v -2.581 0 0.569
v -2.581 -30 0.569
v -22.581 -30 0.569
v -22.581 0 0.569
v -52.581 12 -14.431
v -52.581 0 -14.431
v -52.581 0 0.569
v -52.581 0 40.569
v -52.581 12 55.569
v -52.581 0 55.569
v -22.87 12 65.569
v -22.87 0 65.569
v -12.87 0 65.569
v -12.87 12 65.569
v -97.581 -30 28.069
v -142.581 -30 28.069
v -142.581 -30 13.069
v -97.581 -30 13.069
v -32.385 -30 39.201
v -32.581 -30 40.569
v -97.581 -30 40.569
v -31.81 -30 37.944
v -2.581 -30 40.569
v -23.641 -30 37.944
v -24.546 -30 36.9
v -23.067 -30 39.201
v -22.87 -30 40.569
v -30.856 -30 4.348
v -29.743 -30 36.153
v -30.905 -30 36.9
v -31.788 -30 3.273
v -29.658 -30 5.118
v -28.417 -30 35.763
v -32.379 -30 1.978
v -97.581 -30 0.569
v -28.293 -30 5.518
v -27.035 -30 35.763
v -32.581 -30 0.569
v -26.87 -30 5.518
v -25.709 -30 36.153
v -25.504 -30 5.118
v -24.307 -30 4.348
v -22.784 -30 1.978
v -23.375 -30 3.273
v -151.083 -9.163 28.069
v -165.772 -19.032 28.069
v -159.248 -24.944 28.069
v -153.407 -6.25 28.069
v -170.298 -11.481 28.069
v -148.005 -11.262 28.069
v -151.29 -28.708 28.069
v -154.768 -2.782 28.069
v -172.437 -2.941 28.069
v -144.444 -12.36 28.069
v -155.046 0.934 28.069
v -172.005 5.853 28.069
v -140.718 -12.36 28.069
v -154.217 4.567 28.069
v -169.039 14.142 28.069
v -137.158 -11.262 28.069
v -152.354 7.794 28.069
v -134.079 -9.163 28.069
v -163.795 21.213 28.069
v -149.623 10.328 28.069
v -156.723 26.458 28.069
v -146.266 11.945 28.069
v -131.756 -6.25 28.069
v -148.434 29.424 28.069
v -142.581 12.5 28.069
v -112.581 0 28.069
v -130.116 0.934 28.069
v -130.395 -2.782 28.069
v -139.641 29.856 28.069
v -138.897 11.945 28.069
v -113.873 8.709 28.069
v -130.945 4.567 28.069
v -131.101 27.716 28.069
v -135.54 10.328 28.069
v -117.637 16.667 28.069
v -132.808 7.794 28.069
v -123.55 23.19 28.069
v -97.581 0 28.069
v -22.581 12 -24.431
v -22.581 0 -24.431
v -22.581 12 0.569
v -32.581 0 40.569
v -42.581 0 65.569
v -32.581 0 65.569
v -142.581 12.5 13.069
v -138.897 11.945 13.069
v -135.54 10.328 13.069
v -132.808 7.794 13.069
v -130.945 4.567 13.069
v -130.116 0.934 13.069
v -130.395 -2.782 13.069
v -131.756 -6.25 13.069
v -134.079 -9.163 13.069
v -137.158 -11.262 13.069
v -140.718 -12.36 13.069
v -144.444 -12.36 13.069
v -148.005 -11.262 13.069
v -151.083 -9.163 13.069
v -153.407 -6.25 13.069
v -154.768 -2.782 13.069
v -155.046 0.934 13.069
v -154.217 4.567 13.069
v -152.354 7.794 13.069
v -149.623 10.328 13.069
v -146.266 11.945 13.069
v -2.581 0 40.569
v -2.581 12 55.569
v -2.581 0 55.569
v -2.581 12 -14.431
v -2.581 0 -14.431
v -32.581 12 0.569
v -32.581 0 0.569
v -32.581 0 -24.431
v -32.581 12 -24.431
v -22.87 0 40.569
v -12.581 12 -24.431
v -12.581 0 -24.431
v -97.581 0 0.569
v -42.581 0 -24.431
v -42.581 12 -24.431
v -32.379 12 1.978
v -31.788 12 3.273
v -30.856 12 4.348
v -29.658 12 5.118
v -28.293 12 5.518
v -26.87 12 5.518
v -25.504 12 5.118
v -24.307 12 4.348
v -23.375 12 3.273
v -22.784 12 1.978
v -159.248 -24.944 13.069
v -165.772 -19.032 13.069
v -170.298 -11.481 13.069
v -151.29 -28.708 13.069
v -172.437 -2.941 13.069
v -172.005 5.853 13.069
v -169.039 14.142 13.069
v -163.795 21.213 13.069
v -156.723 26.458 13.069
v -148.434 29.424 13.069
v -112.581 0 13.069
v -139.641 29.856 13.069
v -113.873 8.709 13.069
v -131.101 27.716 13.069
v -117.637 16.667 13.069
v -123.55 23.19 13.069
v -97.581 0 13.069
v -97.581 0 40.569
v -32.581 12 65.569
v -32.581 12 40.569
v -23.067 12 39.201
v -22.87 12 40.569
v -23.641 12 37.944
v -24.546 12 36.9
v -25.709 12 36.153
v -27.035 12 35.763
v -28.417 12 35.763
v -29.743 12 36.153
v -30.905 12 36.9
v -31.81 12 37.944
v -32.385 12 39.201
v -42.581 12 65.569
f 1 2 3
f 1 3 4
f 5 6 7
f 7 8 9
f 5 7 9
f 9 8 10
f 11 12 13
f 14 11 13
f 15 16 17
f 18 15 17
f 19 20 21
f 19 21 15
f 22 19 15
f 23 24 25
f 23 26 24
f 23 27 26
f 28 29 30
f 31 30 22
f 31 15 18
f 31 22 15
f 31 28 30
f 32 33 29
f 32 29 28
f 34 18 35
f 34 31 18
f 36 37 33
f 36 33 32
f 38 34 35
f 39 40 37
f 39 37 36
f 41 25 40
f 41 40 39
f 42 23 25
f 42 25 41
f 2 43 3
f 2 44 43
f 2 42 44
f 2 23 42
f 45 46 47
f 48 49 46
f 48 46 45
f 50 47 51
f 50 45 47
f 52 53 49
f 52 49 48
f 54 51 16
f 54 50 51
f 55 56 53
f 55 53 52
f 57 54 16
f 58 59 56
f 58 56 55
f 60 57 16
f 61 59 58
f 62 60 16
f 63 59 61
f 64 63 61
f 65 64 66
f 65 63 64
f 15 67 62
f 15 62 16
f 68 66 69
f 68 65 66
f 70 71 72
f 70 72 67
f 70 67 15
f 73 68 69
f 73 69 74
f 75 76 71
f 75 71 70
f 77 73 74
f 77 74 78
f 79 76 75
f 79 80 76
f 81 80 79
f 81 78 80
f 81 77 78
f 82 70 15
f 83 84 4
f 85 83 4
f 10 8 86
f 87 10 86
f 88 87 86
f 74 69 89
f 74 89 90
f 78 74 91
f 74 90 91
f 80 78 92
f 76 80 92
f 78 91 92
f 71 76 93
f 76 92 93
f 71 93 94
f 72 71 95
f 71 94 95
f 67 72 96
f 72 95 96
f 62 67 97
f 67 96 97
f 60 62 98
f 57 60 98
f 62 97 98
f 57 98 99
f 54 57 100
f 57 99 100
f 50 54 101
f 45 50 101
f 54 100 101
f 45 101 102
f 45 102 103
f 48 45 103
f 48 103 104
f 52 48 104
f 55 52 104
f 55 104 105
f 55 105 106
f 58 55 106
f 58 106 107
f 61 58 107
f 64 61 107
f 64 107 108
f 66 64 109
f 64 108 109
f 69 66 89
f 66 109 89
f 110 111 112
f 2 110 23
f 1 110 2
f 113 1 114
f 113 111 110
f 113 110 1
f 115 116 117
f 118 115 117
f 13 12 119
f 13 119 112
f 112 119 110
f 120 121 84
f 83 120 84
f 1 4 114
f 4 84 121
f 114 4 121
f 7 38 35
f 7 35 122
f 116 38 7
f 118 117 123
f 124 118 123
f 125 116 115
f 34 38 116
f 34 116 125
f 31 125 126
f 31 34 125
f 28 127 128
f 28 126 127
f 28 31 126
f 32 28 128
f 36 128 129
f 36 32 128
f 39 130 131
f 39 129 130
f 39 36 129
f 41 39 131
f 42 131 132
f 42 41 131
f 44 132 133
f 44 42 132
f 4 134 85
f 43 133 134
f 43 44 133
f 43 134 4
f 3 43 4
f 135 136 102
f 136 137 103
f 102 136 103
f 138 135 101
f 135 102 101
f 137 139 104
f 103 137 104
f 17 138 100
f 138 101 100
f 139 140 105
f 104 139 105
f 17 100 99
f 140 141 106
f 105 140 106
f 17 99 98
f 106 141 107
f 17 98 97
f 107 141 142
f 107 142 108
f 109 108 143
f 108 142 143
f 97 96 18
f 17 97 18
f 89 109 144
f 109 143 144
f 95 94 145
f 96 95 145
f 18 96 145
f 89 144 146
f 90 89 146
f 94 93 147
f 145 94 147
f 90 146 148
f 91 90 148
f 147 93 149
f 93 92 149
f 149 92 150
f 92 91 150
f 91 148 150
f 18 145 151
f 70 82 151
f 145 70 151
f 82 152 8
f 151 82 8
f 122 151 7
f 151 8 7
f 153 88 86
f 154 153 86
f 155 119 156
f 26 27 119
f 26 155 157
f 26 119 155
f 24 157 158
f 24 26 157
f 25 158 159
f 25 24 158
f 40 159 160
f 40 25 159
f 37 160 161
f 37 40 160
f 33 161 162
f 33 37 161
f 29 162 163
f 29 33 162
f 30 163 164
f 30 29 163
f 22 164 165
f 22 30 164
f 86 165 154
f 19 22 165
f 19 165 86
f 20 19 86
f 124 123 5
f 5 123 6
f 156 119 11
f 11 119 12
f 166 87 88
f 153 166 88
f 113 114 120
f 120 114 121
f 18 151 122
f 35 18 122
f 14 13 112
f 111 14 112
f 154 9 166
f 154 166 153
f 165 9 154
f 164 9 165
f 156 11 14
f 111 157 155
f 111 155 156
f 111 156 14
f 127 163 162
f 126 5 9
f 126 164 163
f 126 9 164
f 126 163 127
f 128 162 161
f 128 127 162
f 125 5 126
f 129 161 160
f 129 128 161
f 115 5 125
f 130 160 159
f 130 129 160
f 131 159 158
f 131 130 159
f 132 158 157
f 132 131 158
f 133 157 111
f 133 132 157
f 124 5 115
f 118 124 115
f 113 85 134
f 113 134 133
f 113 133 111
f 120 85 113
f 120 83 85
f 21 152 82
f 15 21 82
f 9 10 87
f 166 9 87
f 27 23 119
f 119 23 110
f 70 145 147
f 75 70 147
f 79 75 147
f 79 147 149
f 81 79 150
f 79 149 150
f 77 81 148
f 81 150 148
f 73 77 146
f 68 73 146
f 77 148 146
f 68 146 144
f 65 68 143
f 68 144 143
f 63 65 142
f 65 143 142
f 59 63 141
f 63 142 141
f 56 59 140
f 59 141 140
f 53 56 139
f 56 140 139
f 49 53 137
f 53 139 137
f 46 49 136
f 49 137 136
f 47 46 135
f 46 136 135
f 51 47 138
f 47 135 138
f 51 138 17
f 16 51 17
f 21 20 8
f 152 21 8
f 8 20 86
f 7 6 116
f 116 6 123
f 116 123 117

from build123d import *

# Parameters (mm, degrees)
BOSS_EXTRUDE1_DEPTH = 12
SKETCH3_W           = 40
SKETCH3_H           = 30
BOSS_EXTRUDE2_DEPTH = 95
CUT_EXTRUDE1_START  = -95
SKETCH5_R           = 5
SKETCH5_R_2         = 4.855667385
CUT_EXTRUDE1_DEPTH  = 95
SKETCH7_R           = 12.5
BOSS_EXTRUDE3_DEPTH = 15


with BuildPart() as part:
    # Sketch1 → Boss-Extrude1 (new body)
    with BuildSketch(Plane(origin=(0, 0, 0), x_dir=(1, 0, 0), z_dir=(0, 1, 0))):
        with BuildLine():
            Line((-32.581308436, 24.430613363), (-42.581308436, 24.430613363))
            Line((-42.581308436, 24.430613363), (-52.581308436, 14.430613363))
            Line((-52.581308436, 14.430613363), (-52.581308436, -55.569386637))
            Line((-52.581308436, -55.569386637), (-42.581308436, -65.569386637))
            Line((-42.581308436, -65.569386637), (-32.581308436, -65.569386637))
            Line((-32.581308436, -65.569386637), (-32.581308436, -40.569386637))
            ThreePointArc((-32.581308436, -40.569386637), (-27.725641051, -35.713719251), (-22.869973665, -40.569386637))
            Line((-22.869973665, -40.569386637), (-22.869973665, -65.569386637))
            Line((-22.869973665, -65.569386637), (-12.869973665, -65.569386637))
            Line((-12.869973665, -65.569386637), (-2.581308436, -55.569386637))
            Line((-2.581308436, -55.569386637), (-2.581308436, 14.430613363))
            Line((-2.581308436, 14.430613363), (-12.581308436, 24.430613363))
            Line((-12.581308436, 24.430613363), (-22.581308436, 24.430613363))
            Line((-22.581308436, 24.430613363), (-22.581308436, -0.569386637))
            ThreePointArc((-22.581308436, -0.569386637), (-27.581308436, -5.569386637), (-32.581308436, -0.569386637))
            Line((-32.581308436, -0.569386637), (-32.581308436, 24.430613363))
        make_face()
    extrude(amount=BOSS_EXTRUDE1_DEPTH)

    # Sketch3 → Boss-Extrude2 (add)
    with BuildSketch(Plane(origin=(-2.581308436, 0, 0), x_dir=(0, 0, -1), z_dir=(1, 0, 0))):
        with Locations((-20.569386637, -15)):
            Rectangle(SKETCH3_W, SKETCH3_H)
    extrude(amount=-BOSS_EXTRUDE2_DEPTH)

    # Sketch5 → Cut-Extrude1 (cut)
    with BuildSketch(Plane(origin=(0, 12, 0), x_dir=(1, 0, 0), z_dir=(0, 1, 0)).offset(CUT_EXTRUDE1_START)):
        with Locations((-27.581308436, -0.569386637)):
            Circle(SKETCH5_R)
        with Locations((-27.725641051, -40.569386637)):
            Circle(SKETCH5_R_2)
    extrude(amount=CUT_EXTRUDE1_DEPTH, mode=Mode.SUBTRACT)

    # Sketch7 → Boss-Extrude3 (add)
    with BuildSketch(Plane(origin=(0, 0, 13.069386637), x_dir=(-1, 0, 0), z_dir=(0, 0, -1))):
        with BuildLine():
            Line((97.581308436, 0), (112.581308436, 0))
            ThreePointArc((112.581308436, 0), (163.794511872, 21.213203436), (142.581308436, -30))
            Line((142.581308436, -30), (97.581308436, -30))
            Line((97.581308436, -30), (97.581308436, 0))
        make_face()
        with Locations(Location((142.581308436, 0, 0), (0, 0, 90))):
            Circle(SKETCH7_R, mode=Mode.SUBTRACT)
    extrude(amount=-BOSS_EXTRUDE3_DEPTH)


solid = part.part
